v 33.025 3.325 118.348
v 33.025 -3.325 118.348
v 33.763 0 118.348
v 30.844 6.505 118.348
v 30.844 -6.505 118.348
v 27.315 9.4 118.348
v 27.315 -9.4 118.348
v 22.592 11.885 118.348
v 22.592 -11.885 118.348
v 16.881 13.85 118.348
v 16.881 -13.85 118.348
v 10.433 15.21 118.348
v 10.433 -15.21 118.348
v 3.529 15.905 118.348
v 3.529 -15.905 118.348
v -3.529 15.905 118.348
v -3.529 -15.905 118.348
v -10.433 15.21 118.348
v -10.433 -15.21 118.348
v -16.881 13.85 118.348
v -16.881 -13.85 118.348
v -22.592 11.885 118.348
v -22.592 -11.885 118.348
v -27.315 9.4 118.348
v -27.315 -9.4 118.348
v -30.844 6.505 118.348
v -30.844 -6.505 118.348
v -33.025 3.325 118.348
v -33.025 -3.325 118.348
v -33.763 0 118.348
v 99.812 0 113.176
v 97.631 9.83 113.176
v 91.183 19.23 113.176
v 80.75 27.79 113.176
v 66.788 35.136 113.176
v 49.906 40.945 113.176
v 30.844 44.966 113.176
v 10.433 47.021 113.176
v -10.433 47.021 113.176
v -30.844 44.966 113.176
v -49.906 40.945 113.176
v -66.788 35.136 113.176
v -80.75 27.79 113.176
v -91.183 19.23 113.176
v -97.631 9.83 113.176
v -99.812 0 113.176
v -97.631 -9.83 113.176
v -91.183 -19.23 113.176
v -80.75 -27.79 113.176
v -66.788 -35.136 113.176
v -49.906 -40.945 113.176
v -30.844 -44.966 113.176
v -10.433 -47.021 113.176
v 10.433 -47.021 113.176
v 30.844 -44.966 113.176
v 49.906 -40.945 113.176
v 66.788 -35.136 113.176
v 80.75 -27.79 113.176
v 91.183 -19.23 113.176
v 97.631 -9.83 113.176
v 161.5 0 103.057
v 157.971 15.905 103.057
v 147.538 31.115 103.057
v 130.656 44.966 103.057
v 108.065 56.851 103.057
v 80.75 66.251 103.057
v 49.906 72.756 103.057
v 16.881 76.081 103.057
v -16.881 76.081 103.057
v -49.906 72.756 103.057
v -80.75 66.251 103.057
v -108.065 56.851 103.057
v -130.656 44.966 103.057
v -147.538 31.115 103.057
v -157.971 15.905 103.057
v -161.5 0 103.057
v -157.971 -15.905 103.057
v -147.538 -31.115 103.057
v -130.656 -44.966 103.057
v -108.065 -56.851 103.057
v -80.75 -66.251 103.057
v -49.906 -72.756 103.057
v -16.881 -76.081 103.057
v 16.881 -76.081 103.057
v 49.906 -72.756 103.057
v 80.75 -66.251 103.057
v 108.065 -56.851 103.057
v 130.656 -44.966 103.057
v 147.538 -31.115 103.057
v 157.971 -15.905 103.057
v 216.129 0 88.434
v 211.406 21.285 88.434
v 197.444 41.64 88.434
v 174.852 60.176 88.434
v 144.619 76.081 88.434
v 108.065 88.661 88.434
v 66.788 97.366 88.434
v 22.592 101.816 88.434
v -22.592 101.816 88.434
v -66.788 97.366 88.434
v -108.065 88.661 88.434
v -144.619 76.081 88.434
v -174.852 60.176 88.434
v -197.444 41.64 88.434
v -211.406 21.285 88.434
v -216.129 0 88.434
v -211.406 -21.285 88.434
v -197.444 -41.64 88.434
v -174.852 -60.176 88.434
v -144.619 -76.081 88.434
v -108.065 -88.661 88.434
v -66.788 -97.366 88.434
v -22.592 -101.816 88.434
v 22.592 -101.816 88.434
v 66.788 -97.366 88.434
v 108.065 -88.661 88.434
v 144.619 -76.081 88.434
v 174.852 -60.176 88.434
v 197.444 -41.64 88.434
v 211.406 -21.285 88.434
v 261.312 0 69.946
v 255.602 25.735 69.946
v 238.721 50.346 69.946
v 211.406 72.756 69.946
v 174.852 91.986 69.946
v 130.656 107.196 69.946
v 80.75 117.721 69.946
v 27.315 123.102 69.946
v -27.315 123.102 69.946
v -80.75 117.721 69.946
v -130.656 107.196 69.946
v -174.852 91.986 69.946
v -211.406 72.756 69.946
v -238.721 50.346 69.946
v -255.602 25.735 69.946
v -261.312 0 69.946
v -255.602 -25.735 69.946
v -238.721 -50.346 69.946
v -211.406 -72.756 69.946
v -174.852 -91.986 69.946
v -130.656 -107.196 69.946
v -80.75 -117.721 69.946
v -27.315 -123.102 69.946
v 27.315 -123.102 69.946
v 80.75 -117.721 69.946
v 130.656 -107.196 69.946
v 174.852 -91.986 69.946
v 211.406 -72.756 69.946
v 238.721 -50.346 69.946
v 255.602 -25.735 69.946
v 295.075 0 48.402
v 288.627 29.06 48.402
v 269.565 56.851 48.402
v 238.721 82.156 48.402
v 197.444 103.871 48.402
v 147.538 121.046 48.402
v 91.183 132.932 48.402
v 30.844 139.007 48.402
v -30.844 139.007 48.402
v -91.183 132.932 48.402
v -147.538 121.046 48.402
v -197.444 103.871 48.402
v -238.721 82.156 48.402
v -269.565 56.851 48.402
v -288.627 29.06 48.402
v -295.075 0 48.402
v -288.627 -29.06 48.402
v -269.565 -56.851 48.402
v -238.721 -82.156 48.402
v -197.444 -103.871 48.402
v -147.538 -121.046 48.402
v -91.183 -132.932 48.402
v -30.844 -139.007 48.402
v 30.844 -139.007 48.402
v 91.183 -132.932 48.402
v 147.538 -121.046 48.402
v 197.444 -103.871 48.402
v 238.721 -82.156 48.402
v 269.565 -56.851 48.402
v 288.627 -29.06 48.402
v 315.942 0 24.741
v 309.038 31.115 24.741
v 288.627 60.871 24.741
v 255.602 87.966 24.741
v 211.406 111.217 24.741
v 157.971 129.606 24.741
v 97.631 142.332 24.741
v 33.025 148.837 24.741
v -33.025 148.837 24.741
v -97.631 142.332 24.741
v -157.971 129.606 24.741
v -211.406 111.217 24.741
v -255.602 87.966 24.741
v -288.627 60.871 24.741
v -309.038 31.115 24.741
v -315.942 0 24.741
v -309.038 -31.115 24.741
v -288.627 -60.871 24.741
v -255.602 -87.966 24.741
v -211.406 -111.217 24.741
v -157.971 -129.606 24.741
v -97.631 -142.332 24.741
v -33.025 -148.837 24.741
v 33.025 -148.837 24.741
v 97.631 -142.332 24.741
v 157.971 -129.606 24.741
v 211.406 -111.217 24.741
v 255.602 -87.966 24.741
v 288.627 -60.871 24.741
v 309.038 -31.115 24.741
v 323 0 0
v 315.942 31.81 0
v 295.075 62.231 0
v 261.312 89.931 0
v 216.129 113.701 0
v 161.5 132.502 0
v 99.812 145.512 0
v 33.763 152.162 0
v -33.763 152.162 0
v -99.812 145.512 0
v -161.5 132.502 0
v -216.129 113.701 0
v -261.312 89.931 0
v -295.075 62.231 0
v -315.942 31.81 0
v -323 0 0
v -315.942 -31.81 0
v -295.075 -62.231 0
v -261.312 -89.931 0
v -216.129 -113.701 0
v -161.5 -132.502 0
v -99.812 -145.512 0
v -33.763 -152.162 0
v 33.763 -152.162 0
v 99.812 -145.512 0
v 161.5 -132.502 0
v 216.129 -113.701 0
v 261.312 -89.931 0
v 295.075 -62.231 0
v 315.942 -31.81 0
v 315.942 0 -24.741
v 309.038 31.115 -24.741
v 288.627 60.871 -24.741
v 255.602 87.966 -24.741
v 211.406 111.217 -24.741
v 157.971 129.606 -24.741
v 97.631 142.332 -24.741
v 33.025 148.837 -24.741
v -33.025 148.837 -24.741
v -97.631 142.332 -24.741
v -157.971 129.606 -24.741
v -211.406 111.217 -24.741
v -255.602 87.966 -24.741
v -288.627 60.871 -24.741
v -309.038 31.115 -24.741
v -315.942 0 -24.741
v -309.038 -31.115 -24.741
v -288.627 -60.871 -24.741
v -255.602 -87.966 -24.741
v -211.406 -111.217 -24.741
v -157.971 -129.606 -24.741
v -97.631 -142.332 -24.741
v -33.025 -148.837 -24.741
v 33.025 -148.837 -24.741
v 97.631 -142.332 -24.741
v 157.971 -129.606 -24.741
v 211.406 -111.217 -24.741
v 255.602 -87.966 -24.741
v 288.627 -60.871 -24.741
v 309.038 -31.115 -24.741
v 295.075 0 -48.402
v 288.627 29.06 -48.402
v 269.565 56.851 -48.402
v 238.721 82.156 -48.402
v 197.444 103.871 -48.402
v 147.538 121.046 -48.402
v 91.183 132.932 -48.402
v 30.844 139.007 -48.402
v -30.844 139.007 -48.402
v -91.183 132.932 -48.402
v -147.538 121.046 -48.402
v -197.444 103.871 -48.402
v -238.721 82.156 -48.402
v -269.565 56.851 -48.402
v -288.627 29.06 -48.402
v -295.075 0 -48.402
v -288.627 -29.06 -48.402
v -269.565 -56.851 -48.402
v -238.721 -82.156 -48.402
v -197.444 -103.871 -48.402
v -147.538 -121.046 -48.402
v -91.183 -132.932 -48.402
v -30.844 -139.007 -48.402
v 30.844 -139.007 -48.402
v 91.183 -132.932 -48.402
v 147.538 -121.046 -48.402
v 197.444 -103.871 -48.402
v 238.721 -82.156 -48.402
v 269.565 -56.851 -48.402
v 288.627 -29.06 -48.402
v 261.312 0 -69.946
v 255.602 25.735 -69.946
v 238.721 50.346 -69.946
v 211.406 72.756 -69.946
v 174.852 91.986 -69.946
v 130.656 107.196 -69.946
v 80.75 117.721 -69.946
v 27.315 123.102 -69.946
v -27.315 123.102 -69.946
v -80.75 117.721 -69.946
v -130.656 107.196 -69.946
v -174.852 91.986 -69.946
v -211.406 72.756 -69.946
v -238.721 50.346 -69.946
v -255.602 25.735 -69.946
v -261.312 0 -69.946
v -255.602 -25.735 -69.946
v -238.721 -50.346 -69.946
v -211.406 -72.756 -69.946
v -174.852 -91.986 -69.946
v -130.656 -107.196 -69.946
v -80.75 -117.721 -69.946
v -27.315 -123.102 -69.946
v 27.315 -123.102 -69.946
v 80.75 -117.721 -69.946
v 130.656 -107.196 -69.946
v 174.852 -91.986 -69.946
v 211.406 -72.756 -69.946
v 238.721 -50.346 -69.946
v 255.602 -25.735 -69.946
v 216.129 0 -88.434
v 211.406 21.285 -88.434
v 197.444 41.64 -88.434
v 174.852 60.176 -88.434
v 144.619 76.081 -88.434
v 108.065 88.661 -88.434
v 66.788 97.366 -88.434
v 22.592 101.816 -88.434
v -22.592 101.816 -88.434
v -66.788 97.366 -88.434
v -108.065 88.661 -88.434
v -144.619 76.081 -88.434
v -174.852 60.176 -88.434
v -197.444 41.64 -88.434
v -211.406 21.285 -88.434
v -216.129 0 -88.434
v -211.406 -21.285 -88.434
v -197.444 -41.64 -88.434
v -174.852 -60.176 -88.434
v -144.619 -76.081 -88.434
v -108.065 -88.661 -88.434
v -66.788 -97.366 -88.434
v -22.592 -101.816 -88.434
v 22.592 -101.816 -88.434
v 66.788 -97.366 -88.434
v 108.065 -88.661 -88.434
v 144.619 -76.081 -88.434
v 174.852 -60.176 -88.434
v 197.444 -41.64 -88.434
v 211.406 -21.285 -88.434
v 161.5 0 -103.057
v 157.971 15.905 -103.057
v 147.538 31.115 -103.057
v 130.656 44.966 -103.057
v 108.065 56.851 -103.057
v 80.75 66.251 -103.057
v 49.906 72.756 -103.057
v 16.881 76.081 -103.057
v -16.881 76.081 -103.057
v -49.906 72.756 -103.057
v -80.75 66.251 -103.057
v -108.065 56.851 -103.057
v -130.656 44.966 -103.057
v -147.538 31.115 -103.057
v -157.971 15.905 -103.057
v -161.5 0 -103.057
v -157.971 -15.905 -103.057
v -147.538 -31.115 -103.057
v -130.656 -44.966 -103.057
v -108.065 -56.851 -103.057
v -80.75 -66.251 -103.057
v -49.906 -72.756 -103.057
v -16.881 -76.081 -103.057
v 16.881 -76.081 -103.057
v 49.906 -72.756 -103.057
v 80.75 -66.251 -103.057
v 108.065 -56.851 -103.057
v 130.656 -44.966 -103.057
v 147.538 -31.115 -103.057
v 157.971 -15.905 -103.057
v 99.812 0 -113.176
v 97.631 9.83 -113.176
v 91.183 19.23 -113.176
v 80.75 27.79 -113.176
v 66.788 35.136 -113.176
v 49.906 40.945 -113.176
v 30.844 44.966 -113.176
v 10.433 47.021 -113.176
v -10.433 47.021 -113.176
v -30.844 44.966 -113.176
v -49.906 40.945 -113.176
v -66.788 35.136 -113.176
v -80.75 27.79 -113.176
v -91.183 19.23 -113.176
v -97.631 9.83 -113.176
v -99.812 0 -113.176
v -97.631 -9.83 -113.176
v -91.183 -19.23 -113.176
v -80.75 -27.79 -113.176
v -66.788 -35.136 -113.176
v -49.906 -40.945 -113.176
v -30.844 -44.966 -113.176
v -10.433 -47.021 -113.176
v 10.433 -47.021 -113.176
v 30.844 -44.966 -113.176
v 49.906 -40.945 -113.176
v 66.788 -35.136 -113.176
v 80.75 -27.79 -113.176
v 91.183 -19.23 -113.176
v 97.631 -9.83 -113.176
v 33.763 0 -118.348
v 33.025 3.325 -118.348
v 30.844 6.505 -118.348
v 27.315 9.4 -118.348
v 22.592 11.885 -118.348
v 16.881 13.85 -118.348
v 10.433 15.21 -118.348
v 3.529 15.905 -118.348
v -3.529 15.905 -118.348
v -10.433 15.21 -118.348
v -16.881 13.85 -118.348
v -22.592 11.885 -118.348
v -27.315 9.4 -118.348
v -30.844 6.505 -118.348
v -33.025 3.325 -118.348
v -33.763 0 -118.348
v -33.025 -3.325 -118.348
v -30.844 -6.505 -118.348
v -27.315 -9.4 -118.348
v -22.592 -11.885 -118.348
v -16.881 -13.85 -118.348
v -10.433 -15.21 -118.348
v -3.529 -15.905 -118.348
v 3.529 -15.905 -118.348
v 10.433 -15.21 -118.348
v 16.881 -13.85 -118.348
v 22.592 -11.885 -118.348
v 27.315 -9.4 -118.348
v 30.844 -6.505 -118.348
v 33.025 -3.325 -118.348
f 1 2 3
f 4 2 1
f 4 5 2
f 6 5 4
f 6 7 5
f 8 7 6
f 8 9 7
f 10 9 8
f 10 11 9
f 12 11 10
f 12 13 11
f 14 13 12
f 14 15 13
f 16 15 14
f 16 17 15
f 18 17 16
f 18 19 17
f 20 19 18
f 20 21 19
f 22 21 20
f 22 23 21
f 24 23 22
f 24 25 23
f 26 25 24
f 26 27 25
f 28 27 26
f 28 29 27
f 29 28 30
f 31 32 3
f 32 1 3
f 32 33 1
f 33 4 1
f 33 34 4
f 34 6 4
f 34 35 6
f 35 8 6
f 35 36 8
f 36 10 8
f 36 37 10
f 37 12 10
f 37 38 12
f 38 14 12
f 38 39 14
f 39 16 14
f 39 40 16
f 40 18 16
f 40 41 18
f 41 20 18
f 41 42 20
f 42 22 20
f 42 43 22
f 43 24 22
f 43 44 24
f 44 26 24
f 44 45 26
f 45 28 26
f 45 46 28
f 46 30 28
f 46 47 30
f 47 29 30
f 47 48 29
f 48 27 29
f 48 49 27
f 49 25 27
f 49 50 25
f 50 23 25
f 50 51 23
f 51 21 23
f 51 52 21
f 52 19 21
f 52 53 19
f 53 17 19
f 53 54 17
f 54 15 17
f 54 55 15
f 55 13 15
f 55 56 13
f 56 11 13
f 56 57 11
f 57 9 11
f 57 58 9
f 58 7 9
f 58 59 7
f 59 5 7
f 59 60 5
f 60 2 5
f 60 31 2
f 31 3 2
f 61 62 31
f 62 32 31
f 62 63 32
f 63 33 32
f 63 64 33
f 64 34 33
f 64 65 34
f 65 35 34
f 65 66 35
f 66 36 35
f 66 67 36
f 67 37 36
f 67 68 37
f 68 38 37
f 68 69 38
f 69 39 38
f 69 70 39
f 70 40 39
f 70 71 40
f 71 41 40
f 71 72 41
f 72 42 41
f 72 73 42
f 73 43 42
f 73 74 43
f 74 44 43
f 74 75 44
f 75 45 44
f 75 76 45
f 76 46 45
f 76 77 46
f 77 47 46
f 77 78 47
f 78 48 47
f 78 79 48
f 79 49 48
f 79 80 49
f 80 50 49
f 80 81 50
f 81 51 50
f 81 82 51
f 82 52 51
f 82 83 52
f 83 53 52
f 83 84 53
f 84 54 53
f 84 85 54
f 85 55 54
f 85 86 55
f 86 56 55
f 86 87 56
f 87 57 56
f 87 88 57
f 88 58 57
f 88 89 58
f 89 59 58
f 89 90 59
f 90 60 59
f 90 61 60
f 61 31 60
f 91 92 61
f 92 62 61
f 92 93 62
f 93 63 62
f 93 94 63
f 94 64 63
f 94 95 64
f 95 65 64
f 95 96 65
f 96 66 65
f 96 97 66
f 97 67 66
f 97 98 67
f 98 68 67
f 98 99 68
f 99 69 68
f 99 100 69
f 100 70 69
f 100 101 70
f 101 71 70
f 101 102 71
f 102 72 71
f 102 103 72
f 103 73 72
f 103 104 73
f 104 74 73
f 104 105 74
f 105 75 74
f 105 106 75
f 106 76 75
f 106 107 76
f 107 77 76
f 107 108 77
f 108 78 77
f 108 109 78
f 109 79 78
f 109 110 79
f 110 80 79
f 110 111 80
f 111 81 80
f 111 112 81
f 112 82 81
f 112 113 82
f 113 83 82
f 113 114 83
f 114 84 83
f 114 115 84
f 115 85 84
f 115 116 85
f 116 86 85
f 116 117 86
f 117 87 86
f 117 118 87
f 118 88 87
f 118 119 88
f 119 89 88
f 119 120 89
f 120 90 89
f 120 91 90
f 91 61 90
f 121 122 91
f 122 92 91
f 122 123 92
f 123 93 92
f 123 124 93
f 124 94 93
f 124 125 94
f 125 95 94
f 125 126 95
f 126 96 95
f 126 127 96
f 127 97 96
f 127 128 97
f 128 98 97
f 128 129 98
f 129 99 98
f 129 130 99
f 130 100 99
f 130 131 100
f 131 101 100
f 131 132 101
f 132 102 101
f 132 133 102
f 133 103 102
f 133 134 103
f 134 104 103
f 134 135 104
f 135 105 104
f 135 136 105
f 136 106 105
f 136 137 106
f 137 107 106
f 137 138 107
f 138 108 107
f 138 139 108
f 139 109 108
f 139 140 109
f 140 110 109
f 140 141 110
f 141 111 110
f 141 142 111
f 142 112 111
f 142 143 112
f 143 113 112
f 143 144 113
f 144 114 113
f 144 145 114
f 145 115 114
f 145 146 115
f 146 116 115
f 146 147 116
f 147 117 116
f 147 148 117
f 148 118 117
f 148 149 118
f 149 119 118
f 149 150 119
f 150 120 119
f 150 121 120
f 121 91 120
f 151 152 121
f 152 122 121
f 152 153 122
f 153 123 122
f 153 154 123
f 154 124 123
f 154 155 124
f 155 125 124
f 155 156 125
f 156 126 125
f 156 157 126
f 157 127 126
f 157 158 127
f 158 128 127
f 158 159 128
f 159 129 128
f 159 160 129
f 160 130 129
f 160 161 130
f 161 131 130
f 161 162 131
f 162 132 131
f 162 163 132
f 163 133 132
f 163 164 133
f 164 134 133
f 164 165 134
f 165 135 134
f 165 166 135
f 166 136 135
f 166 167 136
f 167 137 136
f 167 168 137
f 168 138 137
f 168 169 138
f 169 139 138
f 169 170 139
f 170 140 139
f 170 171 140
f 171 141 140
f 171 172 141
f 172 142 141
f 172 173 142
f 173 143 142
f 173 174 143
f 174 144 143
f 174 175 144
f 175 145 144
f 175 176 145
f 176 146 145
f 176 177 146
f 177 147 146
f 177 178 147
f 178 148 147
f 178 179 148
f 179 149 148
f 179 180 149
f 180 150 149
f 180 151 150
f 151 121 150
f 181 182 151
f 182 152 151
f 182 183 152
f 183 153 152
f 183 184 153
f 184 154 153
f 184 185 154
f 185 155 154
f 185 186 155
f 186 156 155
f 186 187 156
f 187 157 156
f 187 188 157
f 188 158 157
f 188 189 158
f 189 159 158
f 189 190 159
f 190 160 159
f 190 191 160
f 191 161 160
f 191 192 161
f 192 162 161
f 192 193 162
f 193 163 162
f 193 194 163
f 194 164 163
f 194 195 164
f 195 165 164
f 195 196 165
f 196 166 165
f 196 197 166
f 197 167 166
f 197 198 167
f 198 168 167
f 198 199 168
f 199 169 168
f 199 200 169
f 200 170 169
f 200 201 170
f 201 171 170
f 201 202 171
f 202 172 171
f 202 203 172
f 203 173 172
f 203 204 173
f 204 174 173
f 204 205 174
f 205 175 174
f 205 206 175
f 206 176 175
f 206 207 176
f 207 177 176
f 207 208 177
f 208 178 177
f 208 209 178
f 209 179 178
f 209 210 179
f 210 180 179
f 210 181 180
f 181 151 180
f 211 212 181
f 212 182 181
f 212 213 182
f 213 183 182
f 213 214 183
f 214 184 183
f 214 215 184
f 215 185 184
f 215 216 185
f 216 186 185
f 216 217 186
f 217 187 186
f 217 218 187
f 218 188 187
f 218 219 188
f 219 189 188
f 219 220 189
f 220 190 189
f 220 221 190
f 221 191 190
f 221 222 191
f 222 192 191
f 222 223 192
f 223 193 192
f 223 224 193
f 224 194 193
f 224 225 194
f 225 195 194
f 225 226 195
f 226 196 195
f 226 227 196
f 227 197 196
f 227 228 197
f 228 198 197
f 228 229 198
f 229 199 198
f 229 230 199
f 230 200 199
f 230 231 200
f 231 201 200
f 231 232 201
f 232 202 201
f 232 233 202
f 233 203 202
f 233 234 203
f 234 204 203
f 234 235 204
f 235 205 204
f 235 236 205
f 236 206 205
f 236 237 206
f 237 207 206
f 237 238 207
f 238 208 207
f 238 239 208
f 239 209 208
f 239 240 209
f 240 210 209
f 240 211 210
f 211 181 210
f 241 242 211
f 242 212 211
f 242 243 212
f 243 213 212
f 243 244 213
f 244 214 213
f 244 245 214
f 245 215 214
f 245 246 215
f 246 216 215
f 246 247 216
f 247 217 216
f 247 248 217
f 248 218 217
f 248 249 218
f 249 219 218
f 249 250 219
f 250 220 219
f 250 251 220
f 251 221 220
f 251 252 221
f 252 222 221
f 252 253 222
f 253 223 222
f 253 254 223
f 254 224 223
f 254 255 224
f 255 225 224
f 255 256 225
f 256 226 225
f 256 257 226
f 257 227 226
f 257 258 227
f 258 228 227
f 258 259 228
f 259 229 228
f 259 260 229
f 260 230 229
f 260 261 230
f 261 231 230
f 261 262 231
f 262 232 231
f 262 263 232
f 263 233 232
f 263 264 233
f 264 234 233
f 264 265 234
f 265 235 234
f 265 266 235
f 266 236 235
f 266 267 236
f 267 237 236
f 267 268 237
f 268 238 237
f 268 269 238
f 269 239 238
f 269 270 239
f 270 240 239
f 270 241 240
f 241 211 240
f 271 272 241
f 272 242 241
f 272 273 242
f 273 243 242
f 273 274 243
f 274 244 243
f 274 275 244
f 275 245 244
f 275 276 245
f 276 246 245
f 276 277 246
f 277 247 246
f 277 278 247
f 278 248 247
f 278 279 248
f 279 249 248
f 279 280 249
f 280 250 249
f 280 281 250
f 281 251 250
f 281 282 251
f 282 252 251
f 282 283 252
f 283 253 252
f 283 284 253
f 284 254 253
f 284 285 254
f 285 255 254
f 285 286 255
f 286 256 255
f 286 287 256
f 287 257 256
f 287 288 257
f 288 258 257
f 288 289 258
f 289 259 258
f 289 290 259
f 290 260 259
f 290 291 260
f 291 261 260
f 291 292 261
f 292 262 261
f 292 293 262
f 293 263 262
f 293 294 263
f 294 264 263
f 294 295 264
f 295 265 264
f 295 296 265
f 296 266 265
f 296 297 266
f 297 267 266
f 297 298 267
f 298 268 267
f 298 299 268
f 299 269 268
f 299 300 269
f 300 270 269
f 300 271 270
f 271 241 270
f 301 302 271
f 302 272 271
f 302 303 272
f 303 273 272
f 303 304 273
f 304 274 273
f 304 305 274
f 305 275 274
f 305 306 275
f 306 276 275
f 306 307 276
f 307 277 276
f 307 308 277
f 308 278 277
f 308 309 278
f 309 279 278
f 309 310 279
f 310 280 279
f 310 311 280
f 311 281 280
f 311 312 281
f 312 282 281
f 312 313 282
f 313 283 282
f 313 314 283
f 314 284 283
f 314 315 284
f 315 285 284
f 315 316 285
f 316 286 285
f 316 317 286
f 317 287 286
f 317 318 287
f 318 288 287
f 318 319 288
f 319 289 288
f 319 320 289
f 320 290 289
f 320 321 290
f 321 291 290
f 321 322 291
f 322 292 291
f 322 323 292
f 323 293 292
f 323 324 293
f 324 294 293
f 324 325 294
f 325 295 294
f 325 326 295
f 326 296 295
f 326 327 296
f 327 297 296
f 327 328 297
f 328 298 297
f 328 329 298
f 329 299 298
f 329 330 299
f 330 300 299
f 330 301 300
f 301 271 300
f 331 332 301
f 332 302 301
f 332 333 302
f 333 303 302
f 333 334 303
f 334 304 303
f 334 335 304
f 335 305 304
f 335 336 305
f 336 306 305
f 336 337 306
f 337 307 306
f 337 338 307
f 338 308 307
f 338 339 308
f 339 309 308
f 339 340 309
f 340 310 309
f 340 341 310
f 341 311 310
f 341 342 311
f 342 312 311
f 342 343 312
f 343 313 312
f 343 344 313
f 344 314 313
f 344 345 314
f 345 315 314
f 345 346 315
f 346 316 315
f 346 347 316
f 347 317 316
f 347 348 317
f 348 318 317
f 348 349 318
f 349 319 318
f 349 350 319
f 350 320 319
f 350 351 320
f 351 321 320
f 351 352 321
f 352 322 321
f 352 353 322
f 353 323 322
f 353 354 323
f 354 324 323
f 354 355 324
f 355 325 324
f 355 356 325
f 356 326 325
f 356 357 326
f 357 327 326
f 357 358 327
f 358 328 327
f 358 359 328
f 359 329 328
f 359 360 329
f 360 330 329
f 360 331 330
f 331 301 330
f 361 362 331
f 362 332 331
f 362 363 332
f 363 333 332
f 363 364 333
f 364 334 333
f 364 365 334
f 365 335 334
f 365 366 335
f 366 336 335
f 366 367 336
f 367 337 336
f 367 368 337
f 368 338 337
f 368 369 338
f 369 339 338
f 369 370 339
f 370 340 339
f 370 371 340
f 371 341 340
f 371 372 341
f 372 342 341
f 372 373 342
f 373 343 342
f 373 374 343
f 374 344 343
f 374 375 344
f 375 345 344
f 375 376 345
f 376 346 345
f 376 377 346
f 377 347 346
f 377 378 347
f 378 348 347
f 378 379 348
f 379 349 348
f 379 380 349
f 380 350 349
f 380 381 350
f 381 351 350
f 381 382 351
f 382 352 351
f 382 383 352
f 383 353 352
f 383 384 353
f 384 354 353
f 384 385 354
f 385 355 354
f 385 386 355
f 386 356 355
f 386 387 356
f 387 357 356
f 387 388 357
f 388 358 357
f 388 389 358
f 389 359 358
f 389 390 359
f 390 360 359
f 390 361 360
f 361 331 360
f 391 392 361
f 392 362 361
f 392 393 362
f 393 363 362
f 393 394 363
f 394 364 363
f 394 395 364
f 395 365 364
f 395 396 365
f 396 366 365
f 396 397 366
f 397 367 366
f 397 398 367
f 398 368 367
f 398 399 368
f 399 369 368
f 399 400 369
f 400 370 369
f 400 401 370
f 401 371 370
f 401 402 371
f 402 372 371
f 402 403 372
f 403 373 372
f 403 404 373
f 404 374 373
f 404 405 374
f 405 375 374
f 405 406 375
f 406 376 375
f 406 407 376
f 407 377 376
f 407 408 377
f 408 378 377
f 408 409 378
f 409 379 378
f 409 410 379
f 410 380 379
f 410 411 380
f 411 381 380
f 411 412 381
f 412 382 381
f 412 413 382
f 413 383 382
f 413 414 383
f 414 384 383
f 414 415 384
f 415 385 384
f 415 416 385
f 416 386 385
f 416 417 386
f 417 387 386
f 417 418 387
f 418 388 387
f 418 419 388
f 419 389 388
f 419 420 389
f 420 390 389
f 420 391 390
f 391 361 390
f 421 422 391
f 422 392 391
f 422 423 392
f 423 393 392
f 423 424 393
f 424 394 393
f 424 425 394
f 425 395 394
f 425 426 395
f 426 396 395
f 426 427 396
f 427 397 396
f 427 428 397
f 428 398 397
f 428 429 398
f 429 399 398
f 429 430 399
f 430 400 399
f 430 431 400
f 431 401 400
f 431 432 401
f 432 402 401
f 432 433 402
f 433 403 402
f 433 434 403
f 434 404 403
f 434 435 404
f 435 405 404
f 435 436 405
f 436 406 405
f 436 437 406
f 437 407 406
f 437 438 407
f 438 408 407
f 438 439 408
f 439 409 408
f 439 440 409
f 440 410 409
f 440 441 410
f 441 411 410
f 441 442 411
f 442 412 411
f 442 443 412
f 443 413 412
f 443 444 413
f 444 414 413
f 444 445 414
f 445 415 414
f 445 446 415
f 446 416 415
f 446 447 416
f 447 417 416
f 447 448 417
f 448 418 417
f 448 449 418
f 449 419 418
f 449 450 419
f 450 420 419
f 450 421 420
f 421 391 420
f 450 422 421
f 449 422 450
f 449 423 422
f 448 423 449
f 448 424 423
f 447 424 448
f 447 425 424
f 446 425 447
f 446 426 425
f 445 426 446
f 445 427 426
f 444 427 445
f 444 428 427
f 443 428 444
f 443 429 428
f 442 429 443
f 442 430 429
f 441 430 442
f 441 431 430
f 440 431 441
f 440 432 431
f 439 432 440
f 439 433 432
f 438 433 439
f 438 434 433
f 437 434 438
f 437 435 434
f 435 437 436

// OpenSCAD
// Generated by SolidPython 1.0.1 on 2020-07-29 00:46:54


scale(v = [19, 9, 7]) {
	sphere(r = 17);
}
/***********************************************
*********      SolidPython code:      **********
************************************************
 
# import packages: SolidPython
from solid import *
from solid.utils import *
from itertools import chain, combinations, permutations


class Resize:

    def __init__(self, scad_file):
        self.scad_file = scad_file
        #self.scad_file = import_scad(scad_file)
        # cone/cylinder param:
        self.r1 = 0
        self.r2 = 0
        self.h = 0
        # rectangular prism param:
        self.w = 0
        self.l = 0
        # ellipse param:
        self.r = 0

    # import OpenScad code (file name corresponds to shape)


    # classify shape + parameters
    def assign(self, param1, param2, param3):
        if self.scad_file == 'cone.scad':
            self.r1 = param1
            self.r2 = param2
            self.h = param3
        elif self.scad_file == 'cylinder.scad':
            self.r1 = param1
            self.r2 = param2
            self.h = param3
        elif self.scad_file == 'rectangularPrism.scad':
            self.h = param1
            self.l = param2
            self.w = param3
        else:
            self.r = param1
            self.h = param2

    # resize parameters
    def iterate(self):
        x = range(3, 20, 2)
        i = 1
        if self.scad_file == 'cone.scad':
            tempList = list(permutations(x, 2))
            for temp in tempList:
                param1 = temp[0]
                param2 = temp[1]
                filepath = 'produced_scad_files/' + 'cone' + str(param1) + '_' + str(param2) + '_' + '.scad'
                scad_render_to_file(cylinder(h=param1, r1=param2, r2=0), filepath)

        elif self.scad_file == 'cylinder.scad':
            tempList = list(permutations(x, 3))
            for temp in tempList:
                param1 = temp[0]
                param2 = temp[1]
                filepath = 'produced_scad_files/' + 'cylinder' + str(param1) + '_' + str(param2) + '_' + '.scad'
                scad_render_to_file(cylinder(h=param1, r1=param2, r2=param2), filepath)

        elif self.scad_file == 'rectangularPrism.scad':
            tempList = list(permutations(x, 3))
            for temp in tempList:
                param1 = temp[0]
                param2 = temp[1]
                param3 = temp[2]
                filepath = 'produced_scad_files/' + 'rectangularPrism' + str(param1) + '_' + str(param2) + '_' + str(
                    param3) + '.scad'
                scad_render_to_file(cube(size=(param1, param2, param3)), filepath)

        elif self.scad_file == 'ellipse.scad':
            tempList = list(permutations(x, 4))
            for temp in tempList:
                param1 = temp[0]
                param2 = temp[1]
                param3 = temp[2]
                param4 = temp[3]
                filepath = 'produced_scad_files/' + 'ellipse' + str(param1) + '_' + str(param2) + '_' + str(param3) + '_' + str(param4) + '.scad'
                scad_render_to_file(scale([param1, param2, param3])(sphere(r=param4)), filepath)

    def render_to_scadfile(self):
        scad_render_to_file(scad, 'example.scad') 
 
************************************************/
